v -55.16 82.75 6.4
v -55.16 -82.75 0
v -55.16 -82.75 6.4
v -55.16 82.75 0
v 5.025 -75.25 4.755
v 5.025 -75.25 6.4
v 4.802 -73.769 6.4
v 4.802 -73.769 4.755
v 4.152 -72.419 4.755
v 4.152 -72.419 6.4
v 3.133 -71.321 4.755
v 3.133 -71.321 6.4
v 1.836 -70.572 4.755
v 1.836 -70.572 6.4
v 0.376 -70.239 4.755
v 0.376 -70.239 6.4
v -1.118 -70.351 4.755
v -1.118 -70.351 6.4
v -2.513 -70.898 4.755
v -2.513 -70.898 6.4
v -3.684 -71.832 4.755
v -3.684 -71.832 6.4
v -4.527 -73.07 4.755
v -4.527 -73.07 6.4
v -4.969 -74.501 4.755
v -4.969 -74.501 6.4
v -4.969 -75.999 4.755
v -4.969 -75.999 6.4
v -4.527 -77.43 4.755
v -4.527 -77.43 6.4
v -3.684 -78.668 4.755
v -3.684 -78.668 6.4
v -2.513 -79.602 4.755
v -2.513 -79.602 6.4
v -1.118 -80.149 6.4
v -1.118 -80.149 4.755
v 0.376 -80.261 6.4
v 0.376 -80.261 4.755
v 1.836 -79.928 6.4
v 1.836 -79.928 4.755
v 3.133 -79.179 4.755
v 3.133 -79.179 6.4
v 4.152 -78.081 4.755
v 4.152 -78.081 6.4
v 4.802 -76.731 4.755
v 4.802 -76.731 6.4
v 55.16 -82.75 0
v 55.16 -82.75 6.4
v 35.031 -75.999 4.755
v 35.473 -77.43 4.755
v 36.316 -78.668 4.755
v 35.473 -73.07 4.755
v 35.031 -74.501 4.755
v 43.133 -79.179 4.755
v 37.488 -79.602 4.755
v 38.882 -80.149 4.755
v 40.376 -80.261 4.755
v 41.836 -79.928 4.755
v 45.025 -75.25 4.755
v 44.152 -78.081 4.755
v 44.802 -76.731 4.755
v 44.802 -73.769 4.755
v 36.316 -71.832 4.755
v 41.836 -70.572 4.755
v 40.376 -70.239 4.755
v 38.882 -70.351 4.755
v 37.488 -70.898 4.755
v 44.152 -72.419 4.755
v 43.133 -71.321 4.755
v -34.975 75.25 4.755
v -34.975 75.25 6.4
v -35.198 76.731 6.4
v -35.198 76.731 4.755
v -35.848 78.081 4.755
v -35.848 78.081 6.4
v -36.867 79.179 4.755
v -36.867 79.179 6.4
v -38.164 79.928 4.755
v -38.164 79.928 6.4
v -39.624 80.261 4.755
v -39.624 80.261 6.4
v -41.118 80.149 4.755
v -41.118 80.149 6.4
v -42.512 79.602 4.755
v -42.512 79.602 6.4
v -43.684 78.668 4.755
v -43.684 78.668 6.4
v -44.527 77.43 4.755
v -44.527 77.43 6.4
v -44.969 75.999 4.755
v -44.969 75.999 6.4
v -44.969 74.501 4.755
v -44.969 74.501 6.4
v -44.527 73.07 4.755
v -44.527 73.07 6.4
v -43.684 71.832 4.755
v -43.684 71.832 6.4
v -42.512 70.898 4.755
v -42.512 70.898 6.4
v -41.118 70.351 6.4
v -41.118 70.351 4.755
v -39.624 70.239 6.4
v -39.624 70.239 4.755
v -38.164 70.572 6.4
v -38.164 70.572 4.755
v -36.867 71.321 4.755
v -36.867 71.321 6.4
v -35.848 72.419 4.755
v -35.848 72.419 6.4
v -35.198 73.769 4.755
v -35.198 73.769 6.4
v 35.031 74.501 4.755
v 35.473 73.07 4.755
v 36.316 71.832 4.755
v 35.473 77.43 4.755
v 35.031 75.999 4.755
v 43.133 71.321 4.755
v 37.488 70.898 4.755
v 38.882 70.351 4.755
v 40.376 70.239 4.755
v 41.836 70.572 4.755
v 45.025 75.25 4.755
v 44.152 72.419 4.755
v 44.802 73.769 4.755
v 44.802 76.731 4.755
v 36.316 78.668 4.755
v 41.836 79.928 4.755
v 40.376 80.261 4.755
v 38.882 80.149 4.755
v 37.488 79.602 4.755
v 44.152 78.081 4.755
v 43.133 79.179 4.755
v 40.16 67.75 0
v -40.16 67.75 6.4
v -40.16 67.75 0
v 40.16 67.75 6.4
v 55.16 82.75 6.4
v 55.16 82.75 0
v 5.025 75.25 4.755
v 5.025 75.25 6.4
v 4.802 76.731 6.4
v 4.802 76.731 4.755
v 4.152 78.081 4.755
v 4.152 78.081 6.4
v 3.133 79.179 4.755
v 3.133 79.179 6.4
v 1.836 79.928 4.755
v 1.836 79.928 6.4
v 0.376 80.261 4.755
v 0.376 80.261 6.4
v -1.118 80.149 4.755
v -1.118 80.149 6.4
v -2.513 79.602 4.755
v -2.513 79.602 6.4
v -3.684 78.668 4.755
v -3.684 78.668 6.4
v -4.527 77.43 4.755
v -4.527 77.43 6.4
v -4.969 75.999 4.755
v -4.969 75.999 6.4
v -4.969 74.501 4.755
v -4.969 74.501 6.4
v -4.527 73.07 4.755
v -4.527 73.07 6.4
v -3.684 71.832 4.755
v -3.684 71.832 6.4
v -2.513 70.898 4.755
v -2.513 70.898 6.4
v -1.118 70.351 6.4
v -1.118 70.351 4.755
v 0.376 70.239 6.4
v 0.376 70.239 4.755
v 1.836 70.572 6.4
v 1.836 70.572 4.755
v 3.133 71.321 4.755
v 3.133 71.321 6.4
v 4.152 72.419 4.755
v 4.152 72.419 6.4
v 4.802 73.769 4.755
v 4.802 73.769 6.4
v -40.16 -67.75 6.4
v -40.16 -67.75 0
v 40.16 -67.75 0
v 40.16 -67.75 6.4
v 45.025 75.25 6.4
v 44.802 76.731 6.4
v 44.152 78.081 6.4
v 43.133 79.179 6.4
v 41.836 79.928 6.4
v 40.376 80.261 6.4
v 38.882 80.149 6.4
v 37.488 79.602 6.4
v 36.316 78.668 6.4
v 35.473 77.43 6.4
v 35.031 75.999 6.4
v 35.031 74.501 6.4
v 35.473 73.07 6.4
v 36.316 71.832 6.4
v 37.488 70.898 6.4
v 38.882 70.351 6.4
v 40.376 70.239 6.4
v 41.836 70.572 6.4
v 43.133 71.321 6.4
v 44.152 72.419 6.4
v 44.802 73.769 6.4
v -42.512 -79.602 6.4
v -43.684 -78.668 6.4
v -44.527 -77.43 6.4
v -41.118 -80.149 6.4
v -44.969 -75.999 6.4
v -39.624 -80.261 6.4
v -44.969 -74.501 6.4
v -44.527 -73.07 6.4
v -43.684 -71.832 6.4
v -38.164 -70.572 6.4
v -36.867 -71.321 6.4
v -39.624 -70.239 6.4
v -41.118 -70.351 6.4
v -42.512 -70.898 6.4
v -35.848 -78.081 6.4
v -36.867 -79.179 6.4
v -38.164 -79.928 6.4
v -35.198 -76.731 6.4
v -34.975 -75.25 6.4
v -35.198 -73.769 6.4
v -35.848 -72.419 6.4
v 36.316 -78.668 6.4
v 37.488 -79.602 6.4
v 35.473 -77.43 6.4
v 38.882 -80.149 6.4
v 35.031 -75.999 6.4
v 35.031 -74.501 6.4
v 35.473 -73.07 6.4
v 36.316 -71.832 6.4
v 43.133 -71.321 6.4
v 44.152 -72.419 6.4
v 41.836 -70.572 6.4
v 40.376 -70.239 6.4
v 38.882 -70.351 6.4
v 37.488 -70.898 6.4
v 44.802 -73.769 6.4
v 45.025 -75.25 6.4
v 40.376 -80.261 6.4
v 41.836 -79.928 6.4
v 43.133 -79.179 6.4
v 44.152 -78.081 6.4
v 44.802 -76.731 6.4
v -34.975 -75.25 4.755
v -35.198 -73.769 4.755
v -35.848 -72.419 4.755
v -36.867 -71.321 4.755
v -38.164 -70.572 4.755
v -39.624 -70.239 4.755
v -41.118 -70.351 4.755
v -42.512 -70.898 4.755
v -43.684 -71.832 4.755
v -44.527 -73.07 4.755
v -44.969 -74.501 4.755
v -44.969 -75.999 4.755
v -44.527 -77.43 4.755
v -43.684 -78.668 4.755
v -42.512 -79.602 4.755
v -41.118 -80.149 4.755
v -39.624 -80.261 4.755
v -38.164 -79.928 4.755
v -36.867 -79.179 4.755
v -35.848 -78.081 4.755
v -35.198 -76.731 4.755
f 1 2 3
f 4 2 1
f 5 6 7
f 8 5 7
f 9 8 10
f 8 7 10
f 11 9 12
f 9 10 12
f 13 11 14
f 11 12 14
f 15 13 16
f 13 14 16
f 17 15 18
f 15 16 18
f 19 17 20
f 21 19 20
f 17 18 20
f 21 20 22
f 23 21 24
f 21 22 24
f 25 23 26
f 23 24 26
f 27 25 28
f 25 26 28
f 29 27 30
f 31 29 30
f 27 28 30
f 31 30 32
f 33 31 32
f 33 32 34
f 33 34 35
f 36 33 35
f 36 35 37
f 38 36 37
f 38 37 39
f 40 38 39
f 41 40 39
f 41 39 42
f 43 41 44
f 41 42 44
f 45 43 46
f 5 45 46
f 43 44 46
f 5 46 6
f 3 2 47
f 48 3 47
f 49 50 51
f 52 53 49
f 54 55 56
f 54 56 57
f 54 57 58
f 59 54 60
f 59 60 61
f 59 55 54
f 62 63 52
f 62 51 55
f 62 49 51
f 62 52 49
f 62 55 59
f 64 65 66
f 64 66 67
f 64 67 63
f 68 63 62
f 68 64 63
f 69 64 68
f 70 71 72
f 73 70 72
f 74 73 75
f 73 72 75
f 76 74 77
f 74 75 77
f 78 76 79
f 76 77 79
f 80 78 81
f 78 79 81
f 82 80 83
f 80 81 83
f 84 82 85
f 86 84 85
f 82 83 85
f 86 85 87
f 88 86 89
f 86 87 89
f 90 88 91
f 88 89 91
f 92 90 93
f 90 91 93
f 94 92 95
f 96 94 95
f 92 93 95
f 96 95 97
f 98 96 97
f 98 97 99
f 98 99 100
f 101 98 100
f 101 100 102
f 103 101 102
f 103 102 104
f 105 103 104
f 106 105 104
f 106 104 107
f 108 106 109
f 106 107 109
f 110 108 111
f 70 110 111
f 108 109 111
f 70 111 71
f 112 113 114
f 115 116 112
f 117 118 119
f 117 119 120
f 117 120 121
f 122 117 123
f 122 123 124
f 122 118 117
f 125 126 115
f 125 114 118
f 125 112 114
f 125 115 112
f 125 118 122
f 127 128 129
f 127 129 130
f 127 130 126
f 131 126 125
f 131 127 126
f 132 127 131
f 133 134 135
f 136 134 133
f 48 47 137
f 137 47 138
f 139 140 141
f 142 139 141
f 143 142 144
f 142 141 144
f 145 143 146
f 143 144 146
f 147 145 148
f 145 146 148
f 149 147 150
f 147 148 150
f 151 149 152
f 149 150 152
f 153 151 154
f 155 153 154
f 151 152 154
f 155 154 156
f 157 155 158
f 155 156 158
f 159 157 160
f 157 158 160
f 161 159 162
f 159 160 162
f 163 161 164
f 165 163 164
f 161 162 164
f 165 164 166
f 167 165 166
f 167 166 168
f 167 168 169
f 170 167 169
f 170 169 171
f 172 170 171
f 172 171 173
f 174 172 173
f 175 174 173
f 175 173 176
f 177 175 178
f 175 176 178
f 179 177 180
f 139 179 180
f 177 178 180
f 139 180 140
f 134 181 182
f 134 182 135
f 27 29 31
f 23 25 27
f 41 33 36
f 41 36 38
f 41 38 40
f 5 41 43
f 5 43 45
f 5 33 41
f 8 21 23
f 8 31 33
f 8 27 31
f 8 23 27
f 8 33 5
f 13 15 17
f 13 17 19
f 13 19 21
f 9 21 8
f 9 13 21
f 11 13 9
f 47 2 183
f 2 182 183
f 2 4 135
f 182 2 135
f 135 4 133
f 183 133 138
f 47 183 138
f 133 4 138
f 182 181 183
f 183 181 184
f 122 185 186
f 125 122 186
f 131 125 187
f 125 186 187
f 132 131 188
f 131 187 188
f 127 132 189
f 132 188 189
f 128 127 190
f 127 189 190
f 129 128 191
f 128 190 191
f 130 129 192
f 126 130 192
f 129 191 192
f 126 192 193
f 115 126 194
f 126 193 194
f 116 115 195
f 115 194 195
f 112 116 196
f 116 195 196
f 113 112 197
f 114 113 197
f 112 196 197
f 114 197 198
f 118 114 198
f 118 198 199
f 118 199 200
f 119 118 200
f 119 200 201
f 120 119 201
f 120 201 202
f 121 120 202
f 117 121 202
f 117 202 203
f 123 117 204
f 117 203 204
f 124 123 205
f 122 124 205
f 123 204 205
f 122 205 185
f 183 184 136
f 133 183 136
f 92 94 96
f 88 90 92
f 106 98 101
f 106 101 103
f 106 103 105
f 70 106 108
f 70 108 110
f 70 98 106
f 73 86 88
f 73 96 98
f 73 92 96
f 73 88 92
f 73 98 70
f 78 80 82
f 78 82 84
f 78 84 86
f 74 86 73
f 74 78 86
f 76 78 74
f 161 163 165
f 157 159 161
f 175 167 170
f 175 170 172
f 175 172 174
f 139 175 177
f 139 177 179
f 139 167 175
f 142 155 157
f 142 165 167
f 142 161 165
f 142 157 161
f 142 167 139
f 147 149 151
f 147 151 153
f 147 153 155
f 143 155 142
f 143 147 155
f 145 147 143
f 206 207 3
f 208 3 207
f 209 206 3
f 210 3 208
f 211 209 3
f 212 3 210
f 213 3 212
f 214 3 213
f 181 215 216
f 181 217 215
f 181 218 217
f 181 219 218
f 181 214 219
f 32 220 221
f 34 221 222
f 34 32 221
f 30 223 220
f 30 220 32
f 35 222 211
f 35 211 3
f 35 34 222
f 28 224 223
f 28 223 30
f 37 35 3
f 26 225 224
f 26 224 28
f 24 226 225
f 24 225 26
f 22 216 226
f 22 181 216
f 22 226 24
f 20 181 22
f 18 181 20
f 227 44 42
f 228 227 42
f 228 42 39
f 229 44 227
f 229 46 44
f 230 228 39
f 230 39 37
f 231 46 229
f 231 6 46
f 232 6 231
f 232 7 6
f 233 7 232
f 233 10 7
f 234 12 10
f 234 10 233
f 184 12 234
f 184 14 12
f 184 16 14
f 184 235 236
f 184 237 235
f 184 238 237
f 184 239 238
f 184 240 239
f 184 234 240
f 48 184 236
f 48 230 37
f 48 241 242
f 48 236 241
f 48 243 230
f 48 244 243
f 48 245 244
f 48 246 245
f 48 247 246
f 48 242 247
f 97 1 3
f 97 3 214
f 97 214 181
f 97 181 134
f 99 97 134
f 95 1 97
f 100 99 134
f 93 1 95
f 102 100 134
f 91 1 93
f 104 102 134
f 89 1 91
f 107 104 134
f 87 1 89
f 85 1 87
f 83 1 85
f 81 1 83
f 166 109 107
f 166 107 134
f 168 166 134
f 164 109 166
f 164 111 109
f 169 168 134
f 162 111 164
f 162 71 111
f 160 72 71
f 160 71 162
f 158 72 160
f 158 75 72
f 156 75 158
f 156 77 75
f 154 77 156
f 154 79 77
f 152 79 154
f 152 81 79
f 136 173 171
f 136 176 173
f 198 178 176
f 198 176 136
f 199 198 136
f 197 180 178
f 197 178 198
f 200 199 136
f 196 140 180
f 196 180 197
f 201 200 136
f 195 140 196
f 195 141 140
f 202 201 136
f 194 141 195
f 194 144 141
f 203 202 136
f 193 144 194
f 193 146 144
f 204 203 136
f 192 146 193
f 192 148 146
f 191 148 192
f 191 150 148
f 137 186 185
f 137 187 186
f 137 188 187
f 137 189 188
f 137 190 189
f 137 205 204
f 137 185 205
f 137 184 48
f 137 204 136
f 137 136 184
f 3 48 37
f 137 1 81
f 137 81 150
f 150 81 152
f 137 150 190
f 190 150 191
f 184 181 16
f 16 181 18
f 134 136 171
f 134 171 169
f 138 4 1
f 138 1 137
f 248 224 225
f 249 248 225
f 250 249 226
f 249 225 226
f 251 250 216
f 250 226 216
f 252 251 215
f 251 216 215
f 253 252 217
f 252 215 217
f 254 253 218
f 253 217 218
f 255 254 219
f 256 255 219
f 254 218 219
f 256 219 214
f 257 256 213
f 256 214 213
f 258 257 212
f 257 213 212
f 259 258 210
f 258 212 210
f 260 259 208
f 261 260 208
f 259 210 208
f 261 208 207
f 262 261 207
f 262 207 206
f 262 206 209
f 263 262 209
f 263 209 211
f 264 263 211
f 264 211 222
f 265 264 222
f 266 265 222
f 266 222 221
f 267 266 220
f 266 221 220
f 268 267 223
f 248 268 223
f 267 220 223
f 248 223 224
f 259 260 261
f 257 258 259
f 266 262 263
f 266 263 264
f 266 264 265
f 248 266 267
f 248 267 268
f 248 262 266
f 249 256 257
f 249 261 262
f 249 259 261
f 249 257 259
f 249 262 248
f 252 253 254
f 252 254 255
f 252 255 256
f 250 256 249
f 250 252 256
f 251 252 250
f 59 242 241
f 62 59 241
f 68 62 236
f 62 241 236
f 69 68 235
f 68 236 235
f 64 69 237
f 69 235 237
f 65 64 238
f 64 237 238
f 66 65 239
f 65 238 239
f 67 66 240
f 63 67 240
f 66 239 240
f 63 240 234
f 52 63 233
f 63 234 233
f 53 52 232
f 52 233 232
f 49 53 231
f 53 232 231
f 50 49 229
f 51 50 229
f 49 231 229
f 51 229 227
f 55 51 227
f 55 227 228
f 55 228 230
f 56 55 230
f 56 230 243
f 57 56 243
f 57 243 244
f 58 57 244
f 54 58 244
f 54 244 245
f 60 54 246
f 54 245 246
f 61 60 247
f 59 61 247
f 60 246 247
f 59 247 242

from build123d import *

# Parameters (mm, degrees)
SKETCH_W               = 110.32
SKETCH_H               = 165.5
PAD_DEPTH              = 6.4
SKETCH001_W            = 80.32
SKETCH001_H            = 135.5
POCKET_DEPTH           = 6.401
SKETCH002_R            = 5.025
POCKET001_DEPTH        = 1.645
LINEARPATTERN_COUNT    = 2
LINEARPATTERN_PITCH    = 40
LINEARPATTERN001_COUNT = 2
LINEARPATTERN001_PITCH = 40


with BuildPart() as part:
    # Sketch → Pad (new body)
    with BuildSketch(Plane.XY):
        Rectangle(SKETCH_W, SKETCH_H)
    extrude(amount=PAD_DEPTH)

    # Sketch001 → Pocket (cut, through all)
    with BuildSketch(Plane.XY.offset(6.4)):
        Rectangle(SKETCH001_W, SKETCH001_H)
    extrude(amount=-POCKET_DEPTH, mode=Mode.SUBTRACT)

    # Sketch002 → Pocket001 (cut)
    with BuildSketch(Plane.XY.offset(6.4)):
        with Locations((0, 75.25)):
            Circle(SKETCH002_R)
        with Locations((0, -75.25)):
            Circle(SKETCH002_R)
    pocket001 = extrude(amount=-POCKET001_DEPTH, mode=Mode.SUBTRACT)

    # LinearPattern: Pocket001 ×2
    with Locations(*[(i * LINEARPATTERN_PITCH, 0, 0) for i in range(1, LINEARPATTERN_COUNT)]):
        add(pocket001, mode=Mode.SUBTRACT)

    # LinearPattern001: Pocket001 ×2
    with Locations(*[(-i * LINEARPATTERN001_PITCH, 0, 0) for i in range(1, LINEARPATTERN001_COUNT)]):
        add(pocket001, mode=Mode.SUBTRACT)


solid = part.part
